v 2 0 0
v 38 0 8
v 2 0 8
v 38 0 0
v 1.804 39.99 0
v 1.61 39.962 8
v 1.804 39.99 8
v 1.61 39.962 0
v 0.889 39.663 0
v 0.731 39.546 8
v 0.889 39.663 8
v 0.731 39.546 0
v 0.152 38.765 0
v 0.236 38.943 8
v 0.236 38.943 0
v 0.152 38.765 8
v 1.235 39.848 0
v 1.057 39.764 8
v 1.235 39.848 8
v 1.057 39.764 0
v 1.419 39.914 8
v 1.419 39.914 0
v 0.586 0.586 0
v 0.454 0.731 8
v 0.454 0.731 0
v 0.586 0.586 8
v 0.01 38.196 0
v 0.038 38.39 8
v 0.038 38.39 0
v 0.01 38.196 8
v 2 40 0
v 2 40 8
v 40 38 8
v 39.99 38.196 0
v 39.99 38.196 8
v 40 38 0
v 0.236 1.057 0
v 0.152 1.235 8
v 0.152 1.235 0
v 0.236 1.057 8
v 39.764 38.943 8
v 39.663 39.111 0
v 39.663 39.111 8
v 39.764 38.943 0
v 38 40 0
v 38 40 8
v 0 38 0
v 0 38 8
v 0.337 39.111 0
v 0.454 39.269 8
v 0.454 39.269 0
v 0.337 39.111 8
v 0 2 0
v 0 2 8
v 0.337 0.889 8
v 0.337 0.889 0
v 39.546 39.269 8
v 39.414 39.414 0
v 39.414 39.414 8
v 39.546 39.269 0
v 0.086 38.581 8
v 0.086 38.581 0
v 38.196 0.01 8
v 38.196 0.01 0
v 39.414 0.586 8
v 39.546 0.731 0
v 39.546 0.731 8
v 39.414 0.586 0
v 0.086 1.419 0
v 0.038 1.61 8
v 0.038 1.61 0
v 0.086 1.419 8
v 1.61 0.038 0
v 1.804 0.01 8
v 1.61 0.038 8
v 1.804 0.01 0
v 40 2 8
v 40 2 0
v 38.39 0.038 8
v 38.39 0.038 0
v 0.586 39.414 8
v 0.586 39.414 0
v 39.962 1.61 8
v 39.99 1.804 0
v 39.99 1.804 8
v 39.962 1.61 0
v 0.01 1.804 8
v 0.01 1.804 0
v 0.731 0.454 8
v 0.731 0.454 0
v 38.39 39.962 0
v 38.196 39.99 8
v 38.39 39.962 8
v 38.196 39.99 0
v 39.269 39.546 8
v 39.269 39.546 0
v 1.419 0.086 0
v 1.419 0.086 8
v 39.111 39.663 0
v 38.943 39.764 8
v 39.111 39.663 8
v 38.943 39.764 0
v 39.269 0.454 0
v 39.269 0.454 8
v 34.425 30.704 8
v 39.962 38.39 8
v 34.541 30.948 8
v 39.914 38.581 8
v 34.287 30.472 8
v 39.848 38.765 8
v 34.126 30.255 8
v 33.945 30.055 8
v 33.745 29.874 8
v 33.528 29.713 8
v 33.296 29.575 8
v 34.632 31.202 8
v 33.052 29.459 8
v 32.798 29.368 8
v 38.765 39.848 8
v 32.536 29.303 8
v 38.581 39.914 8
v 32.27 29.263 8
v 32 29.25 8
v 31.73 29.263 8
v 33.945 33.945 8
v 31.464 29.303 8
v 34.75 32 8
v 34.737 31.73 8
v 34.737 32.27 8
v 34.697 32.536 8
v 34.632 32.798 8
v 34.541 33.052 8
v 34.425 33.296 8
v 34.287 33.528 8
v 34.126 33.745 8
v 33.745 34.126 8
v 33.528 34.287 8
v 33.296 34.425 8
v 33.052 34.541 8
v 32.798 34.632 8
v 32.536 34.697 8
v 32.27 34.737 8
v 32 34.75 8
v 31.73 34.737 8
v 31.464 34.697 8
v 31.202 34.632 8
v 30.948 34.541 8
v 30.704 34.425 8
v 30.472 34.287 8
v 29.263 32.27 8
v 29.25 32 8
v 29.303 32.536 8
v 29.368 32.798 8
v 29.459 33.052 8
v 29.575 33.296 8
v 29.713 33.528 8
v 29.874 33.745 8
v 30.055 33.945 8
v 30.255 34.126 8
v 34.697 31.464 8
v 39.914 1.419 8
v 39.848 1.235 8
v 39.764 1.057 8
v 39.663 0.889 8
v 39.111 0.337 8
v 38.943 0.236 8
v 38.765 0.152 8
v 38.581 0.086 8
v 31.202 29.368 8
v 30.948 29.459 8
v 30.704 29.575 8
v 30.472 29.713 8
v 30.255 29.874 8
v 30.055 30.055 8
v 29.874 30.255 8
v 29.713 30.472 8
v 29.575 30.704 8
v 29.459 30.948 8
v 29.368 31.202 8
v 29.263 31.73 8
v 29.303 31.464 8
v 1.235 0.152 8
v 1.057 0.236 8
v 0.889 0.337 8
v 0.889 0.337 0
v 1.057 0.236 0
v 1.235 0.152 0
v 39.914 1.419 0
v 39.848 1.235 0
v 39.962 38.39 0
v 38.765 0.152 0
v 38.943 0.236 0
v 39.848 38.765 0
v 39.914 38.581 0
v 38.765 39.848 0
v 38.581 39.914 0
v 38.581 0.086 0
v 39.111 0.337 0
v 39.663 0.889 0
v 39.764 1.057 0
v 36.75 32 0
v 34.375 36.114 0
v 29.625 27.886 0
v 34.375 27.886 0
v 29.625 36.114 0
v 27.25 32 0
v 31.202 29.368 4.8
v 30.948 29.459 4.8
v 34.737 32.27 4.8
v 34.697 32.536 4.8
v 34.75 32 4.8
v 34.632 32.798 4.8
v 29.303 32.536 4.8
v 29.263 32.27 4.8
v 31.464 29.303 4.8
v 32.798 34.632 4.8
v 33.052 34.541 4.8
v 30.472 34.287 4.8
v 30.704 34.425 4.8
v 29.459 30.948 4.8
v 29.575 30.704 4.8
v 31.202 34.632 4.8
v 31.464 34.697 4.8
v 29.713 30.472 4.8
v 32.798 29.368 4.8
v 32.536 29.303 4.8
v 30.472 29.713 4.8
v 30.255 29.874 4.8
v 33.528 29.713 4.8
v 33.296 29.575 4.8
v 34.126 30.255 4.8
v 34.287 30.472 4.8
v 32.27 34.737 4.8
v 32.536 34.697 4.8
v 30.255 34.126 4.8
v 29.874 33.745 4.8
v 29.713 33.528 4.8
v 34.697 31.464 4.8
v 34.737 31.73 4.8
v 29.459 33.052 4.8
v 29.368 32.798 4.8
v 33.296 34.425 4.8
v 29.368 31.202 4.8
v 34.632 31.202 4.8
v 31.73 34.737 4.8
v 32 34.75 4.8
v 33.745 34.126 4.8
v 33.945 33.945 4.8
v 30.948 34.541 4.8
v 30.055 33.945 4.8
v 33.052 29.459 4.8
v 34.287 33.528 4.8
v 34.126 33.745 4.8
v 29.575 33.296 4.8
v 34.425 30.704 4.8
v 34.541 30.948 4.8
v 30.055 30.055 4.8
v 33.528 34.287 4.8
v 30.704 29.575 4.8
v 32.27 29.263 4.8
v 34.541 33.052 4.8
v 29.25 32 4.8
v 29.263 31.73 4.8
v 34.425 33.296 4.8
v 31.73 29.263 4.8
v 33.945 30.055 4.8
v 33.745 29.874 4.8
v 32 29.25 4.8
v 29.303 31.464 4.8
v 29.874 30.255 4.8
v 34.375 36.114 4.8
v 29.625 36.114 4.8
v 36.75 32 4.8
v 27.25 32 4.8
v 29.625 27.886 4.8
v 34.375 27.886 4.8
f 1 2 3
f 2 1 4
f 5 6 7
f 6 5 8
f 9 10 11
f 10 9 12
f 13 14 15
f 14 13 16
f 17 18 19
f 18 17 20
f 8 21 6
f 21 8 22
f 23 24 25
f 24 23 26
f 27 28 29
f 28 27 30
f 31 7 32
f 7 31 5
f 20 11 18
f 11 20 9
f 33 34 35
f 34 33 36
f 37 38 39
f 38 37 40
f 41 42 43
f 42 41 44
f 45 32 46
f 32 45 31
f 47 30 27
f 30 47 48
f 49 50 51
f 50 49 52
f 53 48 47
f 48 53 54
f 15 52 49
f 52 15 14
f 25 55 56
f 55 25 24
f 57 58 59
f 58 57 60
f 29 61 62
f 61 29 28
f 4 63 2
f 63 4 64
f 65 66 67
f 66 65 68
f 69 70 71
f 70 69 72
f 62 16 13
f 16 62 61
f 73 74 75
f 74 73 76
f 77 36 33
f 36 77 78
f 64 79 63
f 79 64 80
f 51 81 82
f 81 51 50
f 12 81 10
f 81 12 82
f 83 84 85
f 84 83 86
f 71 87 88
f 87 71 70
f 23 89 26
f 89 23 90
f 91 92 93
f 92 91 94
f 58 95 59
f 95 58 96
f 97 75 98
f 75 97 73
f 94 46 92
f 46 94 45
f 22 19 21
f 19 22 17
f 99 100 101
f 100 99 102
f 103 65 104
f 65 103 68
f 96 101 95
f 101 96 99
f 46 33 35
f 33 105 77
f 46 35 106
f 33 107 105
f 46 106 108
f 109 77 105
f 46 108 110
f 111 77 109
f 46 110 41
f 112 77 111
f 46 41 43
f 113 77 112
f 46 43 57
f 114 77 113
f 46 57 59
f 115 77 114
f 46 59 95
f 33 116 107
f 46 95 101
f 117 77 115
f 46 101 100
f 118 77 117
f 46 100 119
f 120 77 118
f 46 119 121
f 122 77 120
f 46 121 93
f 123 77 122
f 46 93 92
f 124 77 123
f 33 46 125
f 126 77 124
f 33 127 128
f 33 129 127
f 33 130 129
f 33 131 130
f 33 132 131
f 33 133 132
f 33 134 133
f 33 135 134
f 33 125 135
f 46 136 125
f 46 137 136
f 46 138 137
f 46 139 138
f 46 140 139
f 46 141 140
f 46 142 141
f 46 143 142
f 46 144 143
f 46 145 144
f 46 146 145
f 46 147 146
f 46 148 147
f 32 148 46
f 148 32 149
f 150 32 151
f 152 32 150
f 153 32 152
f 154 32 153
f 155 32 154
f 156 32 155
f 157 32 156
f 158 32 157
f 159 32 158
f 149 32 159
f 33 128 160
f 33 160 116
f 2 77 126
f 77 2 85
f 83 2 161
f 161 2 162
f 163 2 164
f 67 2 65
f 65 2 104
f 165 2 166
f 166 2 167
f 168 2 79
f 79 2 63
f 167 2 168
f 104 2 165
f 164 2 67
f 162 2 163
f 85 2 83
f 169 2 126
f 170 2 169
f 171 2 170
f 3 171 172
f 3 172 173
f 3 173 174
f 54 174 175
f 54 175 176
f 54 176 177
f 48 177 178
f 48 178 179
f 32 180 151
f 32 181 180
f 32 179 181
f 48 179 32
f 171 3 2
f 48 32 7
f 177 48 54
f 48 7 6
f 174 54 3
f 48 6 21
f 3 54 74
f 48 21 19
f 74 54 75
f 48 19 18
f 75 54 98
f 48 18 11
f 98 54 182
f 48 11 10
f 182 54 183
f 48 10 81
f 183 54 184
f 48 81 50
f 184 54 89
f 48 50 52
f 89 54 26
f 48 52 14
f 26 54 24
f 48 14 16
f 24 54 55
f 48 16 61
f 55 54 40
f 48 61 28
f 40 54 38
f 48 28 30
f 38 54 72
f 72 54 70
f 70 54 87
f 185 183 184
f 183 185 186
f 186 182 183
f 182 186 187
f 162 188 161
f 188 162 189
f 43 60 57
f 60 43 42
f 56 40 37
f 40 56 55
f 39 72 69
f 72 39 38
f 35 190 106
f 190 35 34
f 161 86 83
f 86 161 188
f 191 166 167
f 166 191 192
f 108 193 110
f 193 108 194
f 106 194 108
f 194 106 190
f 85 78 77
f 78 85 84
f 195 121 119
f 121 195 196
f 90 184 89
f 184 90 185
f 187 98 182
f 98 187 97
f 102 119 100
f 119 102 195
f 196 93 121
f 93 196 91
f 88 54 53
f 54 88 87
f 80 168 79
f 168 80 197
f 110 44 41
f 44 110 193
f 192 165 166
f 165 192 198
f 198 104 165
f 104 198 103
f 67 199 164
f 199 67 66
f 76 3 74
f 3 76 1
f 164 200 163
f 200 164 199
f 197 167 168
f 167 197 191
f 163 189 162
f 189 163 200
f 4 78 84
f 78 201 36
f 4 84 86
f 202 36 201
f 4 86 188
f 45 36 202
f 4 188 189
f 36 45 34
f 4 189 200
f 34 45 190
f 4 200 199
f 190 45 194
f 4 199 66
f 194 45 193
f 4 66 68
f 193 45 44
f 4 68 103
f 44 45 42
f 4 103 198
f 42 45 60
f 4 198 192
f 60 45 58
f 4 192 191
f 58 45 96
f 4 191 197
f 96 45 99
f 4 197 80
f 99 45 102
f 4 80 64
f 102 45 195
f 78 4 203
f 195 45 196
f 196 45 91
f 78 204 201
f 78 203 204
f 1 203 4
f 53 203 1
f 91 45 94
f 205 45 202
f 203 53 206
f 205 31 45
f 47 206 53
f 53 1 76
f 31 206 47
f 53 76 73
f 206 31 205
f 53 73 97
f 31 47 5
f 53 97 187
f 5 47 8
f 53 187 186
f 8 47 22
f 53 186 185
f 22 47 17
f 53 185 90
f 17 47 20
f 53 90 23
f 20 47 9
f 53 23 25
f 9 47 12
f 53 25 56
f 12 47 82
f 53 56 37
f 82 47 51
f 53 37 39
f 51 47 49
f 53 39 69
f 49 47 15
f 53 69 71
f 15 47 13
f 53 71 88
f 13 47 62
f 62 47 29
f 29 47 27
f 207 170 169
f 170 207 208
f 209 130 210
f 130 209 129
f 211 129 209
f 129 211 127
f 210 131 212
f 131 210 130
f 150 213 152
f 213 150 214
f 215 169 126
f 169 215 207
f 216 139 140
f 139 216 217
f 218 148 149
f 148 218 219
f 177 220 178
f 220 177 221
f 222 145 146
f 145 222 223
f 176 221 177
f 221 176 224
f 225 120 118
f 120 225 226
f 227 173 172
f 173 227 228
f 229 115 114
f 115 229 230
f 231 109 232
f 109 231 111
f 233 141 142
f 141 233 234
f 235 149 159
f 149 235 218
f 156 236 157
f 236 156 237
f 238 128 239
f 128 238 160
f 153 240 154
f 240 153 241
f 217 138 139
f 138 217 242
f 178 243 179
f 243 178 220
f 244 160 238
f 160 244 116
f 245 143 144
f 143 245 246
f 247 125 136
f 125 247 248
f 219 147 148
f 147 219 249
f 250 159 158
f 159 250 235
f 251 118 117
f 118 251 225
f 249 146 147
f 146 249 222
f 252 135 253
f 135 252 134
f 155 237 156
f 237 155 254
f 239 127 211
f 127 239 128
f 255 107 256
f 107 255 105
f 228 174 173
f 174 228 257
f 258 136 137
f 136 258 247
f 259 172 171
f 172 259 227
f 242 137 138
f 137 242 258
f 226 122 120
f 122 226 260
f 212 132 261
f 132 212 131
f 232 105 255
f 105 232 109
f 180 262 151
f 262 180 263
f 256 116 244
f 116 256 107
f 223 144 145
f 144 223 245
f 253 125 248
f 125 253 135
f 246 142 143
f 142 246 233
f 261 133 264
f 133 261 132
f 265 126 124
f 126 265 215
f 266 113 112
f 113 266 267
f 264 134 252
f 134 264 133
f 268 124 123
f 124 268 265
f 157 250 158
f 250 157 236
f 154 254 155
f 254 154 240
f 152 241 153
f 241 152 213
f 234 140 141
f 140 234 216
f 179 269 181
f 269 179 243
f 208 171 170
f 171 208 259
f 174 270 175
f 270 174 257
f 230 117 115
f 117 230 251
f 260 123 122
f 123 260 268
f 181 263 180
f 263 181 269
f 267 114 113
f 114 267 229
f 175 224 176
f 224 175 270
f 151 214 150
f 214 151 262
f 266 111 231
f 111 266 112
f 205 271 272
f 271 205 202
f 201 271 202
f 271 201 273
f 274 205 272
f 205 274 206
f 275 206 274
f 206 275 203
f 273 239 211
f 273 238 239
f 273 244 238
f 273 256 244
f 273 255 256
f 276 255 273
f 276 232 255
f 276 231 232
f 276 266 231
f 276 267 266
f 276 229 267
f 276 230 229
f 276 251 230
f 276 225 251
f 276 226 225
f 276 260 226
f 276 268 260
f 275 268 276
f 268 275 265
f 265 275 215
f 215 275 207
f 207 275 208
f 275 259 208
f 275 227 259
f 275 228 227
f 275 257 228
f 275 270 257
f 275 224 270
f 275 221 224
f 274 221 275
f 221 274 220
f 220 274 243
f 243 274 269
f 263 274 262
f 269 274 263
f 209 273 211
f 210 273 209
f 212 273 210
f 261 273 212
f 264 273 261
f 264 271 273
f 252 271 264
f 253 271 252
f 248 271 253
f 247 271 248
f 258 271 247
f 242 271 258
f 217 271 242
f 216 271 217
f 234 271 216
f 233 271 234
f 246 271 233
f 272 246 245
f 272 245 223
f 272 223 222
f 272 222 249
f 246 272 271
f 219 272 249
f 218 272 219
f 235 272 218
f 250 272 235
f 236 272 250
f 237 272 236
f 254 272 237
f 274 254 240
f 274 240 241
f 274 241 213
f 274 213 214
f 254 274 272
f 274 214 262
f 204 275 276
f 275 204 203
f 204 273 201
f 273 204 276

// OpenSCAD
// file: ../common/shapes.scad
// ============================================================
// Shapes
// Re-usable shapes
// ============================================================

// Concave quarter-cylinder fillet for rounding right angle junctions.
// Improves structural integrity and high speed print quality. Looks nicer, too.
// Place the origin at the corner, rotate to the target face, then union into the parent.
// d: fillet diameter (concave curve radius is d/2); l: length of the produced output.
module inner_fillet( d, l )
{
	xDimension = d;
	yDimension = d;
	zDimension = l;

	difference()
	{
		{
			translate( [(-1 * (xDimension / 2)), (-1 * (yDimension / 2)), 0] )
			{
				cube( [xDimension, yDimension, zDimension] );
			}
		}
		{
			translate( [ 0, 0, -1 ] )
			{
				translate( [0, (-1 * yDimension), 0] )
				{
					cube( [xDimension, yDimension * 2, (zDimension + 2)] );
				}
				translate( [(-1 * xDimension), 0, 0] )
				{
					cube( [xDimension, yDimension, (zDimension + 2)] );
				}

				linear_extrude( height=(zDimension + 2), twist=0, scale=[1, 1], center=false)
				{
					circle(r=(xDimension / 2));
				}

			}

		}

	}
}

// Example:
// inner_fillet( d = 10, l = 20 );
// main file
include <../common/shared-dims.scad>
include <../common/shapes.scad>

$fn = 64;

// Overall plate dimensions
corner_radius   = 2;    // mm — rounded corner radius
plate_width     = 40;   // mm — X
plate_depth     = 40;   // mm — Y
plate_height    = 8;    // mm — Z

// Rounded rectangle helper
module rounded_rect(w, d, h, r) {
    hull() {
        for (x = [r, w - r])
            for (y = [r, d - r])
                translate([x, y, 0])
                    cylinder(r = r, h = h);
    }
}

// L-shape: union of two rounded rectangles
module base_plate(plate_width, plate_depth, plate_height, corner_radius) {
    union() {
        // Bottom portion: full width, Y 0–30
        rounded_rect(plate_width, 30, plate_height, corner_radius);
        // Right portion: X 15–40, full height Y 0–40
        translate([15, 0, 0])
            rounded_rect(plate_width - 15, plate_depth, plate_height, corner_radius);
    }
}

module corner_bracket(include_cutout = false) {
    if (include_cutout) {
        union() {
            difference() {
                base_plate(plate_width, plate_depth, plate_height, corner_radius);
                translate([32, 32, -1])
                    cylinder(d = m5_through_dia, h = plate_height + 2);
                translate([32, 32, 0])
                    cylinder(d = m5_nut_corner_dia, h = m5_nut_depth, $fn = 6);
            }
            // Concave fillet at the inner right-angle corner (X=15, Y=30)
            translate([15 - corner_radius, 30 + corner_radius, 0])
                rotate([0, 0, 90])
                    inner_fillet(d = 4, l = plate_height);
        }
    } else {
        difference() {
            rounded_rect(plate_width, plate_depth, plate_height, corner_radius);
            translate([32, 32, -1])
                cylinder(d = m5_through_dia, h = plate_height + 2);
            translate([32, 32, 0])
                cylinder(d = m5_nut_corner_dia, h = m5_nut_depth, $fn = 6);
        }
    }
}

module front_left_bed_bracket() {
	corner_bracket();
}

module front_right_bed_bracket() {
	rotate([0, 0, 90])
            corner_bracket();
}

module rear_left_bed_bracket() {
	rotate([0, 0, 270])
            corner_bracket();
}

module rear_right_bed_bracket() {
	rotate([0, 0, 180])
            corner_bracket(include_cutout = true);
}

corner_bracket();
